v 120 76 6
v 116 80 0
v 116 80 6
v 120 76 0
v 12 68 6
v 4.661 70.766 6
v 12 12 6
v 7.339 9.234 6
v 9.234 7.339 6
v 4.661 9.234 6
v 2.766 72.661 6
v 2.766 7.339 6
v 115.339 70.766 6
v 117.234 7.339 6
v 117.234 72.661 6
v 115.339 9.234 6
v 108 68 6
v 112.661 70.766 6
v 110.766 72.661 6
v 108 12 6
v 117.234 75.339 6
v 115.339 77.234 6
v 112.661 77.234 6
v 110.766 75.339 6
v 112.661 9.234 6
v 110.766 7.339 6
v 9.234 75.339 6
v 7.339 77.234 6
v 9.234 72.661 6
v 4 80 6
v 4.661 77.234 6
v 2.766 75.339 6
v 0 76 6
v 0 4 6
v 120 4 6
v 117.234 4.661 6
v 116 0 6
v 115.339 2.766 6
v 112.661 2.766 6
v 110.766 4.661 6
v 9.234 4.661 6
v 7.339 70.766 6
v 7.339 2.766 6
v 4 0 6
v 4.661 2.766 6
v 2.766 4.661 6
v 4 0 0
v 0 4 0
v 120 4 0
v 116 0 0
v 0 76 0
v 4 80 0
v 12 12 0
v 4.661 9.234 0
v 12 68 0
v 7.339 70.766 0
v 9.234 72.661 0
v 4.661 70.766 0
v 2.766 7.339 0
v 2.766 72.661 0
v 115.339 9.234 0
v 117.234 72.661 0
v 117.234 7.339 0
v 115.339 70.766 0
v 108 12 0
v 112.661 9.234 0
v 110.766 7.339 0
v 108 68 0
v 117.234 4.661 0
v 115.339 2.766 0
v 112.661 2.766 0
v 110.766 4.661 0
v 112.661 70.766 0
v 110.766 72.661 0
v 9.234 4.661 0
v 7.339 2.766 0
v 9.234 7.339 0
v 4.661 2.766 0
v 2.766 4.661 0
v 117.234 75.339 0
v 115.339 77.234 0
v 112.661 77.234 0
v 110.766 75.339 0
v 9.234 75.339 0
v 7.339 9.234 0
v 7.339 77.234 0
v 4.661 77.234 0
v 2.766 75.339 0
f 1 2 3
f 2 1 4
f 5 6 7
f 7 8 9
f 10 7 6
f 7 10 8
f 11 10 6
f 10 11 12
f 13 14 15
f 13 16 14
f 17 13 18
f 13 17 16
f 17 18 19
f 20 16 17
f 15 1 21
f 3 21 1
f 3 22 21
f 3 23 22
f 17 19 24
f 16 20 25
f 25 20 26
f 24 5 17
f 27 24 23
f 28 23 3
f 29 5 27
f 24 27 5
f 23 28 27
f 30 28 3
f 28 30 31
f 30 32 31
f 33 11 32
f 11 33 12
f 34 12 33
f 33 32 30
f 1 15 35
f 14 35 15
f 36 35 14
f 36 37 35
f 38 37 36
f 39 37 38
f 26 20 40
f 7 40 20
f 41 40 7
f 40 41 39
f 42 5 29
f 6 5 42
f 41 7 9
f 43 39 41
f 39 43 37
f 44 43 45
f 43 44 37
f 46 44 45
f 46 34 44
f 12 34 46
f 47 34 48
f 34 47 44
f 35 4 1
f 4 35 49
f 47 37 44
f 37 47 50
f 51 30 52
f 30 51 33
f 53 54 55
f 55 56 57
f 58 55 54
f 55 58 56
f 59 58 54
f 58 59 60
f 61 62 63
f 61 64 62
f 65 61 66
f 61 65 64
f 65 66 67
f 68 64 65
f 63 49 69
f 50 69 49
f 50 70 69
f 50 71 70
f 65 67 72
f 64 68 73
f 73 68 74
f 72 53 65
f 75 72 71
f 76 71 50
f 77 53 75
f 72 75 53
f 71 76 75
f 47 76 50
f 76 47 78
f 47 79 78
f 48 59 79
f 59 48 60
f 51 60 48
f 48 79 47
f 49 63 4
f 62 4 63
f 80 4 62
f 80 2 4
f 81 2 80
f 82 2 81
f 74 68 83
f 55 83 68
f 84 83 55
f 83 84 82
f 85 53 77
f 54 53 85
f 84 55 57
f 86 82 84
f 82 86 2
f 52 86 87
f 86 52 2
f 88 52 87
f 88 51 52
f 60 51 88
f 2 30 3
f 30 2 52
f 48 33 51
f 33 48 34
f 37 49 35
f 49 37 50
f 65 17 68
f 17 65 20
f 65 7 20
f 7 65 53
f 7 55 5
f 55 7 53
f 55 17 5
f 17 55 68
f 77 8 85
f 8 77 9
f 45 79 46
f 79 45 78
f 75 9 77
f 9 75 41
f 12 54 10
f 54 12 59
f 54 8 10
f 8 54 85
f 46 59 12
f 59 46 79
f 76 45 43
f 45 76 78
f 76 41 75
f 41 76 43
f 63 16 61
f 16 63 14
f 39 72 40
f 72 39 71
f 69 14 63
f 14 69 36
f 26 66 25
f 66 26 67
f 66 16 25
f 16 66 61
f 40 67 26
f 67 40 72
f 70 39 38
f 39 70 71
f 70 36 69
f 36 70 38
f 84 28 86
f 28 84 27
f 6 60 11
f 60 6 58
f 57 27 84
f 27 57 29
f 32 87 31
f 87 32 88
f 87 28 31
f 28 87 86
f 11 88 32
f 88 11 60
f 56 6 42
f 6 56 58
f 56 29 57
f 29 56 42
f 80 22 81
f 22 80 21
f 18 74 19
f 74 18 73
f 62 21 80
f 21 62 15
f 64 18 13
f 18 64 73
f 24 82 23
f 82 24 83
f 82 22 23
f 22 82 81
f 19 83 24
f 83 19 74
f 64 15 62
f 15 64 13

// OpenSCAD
$fn = 32;

// ----------------------------------------------------------------------
// Frame plate: 120 x 80 frame, 12 mm rails
// ----------------------------------------------------------------------

// --- parameters (mm) ---
plate_l = 120;            // plate length, X
plate_w = 80;             // plate width, Y
plate_t = 6;              // plate thickness, Z (extrusion height)
corner_c = 4;             // corner chamfer
frame_bar = 12;           // frame rail width
bolt_r = 3.5;             // corner bolt window radius
bolt_inset = 6;           // bolt centre inset from the edges

win_l = plate_l - 2 * frame_bar;  // window length
win_w = plate_w - 2 * frame_bar;  // window width
bolt_d = 2 * bolt_r;  // corner hole diameter

profile = [[4, 0], [116, 0], [120, 4], [120, 76], [116, 80], [4, 80], [0, 76], [0, 4]];  // primary outline, 8 points, counter clockwise
void_1 = [[12, 12], [108, 12], [108, 68], [12, 68]];  // the window, 4 points
void_2 = [[9.234, 7.339], [7.339, 9.234], [4.661, 9.234], [2.766, 7.339], [2.766, 4.661], [4.661, 2.766], [7.339, 2.766], [9.234, 4.661]];  // corner bolt window, 8 points
void_3 = [[117.234, 7.339], [115.339, 9.234], [112.661, 9.234], [110.766, 7.339], [110.766, 4.661], [112.661, 2.766], [115.339, 2.766], [117.234, 4.661]];  // corner bolt window, 8 points
void_4 = [[9.234, 75.339], [7.339, 77.234], [4.661, 77.234], [2.766, 75.339], [2.766, 72.661], [4.661, 70.766], [7.339, 70.766], [9.234, 72.661]];  // corner bolt window, 8 points
void_5 = [[117.234, 75.339], [115.339, 77.234], [112.661, 77.234], [110.766, 75.339], [110.766, 72.661], [112.661, 70.766], [115.339, 70.766], [117.234, 72.661]];  // corner bolt window, 8 points

// --- the one profile operation ---
difference() {
  linear_extrude(height = plate_t) polygon(points = profile);
  translate([0, 0, -1])
    linear_extrude(height = plate_t + 2) polygon(points = void_1);
  translate([0, 0, -1])
    linear_extrude(height = plate_t + 2) polygon(points = void_2);
  translate([0, 0, -1])
    linear_extrude(height = plate_t + 2) polygon(points = void_3);
  translate([0, 0, -1])
    linear_extrude(height = plate_t + 2) polygon(points = void_4);
  translate([0, 0, -1])
    linear_extrude(height = plate_t + 2) polygon(points = void_5);
}
